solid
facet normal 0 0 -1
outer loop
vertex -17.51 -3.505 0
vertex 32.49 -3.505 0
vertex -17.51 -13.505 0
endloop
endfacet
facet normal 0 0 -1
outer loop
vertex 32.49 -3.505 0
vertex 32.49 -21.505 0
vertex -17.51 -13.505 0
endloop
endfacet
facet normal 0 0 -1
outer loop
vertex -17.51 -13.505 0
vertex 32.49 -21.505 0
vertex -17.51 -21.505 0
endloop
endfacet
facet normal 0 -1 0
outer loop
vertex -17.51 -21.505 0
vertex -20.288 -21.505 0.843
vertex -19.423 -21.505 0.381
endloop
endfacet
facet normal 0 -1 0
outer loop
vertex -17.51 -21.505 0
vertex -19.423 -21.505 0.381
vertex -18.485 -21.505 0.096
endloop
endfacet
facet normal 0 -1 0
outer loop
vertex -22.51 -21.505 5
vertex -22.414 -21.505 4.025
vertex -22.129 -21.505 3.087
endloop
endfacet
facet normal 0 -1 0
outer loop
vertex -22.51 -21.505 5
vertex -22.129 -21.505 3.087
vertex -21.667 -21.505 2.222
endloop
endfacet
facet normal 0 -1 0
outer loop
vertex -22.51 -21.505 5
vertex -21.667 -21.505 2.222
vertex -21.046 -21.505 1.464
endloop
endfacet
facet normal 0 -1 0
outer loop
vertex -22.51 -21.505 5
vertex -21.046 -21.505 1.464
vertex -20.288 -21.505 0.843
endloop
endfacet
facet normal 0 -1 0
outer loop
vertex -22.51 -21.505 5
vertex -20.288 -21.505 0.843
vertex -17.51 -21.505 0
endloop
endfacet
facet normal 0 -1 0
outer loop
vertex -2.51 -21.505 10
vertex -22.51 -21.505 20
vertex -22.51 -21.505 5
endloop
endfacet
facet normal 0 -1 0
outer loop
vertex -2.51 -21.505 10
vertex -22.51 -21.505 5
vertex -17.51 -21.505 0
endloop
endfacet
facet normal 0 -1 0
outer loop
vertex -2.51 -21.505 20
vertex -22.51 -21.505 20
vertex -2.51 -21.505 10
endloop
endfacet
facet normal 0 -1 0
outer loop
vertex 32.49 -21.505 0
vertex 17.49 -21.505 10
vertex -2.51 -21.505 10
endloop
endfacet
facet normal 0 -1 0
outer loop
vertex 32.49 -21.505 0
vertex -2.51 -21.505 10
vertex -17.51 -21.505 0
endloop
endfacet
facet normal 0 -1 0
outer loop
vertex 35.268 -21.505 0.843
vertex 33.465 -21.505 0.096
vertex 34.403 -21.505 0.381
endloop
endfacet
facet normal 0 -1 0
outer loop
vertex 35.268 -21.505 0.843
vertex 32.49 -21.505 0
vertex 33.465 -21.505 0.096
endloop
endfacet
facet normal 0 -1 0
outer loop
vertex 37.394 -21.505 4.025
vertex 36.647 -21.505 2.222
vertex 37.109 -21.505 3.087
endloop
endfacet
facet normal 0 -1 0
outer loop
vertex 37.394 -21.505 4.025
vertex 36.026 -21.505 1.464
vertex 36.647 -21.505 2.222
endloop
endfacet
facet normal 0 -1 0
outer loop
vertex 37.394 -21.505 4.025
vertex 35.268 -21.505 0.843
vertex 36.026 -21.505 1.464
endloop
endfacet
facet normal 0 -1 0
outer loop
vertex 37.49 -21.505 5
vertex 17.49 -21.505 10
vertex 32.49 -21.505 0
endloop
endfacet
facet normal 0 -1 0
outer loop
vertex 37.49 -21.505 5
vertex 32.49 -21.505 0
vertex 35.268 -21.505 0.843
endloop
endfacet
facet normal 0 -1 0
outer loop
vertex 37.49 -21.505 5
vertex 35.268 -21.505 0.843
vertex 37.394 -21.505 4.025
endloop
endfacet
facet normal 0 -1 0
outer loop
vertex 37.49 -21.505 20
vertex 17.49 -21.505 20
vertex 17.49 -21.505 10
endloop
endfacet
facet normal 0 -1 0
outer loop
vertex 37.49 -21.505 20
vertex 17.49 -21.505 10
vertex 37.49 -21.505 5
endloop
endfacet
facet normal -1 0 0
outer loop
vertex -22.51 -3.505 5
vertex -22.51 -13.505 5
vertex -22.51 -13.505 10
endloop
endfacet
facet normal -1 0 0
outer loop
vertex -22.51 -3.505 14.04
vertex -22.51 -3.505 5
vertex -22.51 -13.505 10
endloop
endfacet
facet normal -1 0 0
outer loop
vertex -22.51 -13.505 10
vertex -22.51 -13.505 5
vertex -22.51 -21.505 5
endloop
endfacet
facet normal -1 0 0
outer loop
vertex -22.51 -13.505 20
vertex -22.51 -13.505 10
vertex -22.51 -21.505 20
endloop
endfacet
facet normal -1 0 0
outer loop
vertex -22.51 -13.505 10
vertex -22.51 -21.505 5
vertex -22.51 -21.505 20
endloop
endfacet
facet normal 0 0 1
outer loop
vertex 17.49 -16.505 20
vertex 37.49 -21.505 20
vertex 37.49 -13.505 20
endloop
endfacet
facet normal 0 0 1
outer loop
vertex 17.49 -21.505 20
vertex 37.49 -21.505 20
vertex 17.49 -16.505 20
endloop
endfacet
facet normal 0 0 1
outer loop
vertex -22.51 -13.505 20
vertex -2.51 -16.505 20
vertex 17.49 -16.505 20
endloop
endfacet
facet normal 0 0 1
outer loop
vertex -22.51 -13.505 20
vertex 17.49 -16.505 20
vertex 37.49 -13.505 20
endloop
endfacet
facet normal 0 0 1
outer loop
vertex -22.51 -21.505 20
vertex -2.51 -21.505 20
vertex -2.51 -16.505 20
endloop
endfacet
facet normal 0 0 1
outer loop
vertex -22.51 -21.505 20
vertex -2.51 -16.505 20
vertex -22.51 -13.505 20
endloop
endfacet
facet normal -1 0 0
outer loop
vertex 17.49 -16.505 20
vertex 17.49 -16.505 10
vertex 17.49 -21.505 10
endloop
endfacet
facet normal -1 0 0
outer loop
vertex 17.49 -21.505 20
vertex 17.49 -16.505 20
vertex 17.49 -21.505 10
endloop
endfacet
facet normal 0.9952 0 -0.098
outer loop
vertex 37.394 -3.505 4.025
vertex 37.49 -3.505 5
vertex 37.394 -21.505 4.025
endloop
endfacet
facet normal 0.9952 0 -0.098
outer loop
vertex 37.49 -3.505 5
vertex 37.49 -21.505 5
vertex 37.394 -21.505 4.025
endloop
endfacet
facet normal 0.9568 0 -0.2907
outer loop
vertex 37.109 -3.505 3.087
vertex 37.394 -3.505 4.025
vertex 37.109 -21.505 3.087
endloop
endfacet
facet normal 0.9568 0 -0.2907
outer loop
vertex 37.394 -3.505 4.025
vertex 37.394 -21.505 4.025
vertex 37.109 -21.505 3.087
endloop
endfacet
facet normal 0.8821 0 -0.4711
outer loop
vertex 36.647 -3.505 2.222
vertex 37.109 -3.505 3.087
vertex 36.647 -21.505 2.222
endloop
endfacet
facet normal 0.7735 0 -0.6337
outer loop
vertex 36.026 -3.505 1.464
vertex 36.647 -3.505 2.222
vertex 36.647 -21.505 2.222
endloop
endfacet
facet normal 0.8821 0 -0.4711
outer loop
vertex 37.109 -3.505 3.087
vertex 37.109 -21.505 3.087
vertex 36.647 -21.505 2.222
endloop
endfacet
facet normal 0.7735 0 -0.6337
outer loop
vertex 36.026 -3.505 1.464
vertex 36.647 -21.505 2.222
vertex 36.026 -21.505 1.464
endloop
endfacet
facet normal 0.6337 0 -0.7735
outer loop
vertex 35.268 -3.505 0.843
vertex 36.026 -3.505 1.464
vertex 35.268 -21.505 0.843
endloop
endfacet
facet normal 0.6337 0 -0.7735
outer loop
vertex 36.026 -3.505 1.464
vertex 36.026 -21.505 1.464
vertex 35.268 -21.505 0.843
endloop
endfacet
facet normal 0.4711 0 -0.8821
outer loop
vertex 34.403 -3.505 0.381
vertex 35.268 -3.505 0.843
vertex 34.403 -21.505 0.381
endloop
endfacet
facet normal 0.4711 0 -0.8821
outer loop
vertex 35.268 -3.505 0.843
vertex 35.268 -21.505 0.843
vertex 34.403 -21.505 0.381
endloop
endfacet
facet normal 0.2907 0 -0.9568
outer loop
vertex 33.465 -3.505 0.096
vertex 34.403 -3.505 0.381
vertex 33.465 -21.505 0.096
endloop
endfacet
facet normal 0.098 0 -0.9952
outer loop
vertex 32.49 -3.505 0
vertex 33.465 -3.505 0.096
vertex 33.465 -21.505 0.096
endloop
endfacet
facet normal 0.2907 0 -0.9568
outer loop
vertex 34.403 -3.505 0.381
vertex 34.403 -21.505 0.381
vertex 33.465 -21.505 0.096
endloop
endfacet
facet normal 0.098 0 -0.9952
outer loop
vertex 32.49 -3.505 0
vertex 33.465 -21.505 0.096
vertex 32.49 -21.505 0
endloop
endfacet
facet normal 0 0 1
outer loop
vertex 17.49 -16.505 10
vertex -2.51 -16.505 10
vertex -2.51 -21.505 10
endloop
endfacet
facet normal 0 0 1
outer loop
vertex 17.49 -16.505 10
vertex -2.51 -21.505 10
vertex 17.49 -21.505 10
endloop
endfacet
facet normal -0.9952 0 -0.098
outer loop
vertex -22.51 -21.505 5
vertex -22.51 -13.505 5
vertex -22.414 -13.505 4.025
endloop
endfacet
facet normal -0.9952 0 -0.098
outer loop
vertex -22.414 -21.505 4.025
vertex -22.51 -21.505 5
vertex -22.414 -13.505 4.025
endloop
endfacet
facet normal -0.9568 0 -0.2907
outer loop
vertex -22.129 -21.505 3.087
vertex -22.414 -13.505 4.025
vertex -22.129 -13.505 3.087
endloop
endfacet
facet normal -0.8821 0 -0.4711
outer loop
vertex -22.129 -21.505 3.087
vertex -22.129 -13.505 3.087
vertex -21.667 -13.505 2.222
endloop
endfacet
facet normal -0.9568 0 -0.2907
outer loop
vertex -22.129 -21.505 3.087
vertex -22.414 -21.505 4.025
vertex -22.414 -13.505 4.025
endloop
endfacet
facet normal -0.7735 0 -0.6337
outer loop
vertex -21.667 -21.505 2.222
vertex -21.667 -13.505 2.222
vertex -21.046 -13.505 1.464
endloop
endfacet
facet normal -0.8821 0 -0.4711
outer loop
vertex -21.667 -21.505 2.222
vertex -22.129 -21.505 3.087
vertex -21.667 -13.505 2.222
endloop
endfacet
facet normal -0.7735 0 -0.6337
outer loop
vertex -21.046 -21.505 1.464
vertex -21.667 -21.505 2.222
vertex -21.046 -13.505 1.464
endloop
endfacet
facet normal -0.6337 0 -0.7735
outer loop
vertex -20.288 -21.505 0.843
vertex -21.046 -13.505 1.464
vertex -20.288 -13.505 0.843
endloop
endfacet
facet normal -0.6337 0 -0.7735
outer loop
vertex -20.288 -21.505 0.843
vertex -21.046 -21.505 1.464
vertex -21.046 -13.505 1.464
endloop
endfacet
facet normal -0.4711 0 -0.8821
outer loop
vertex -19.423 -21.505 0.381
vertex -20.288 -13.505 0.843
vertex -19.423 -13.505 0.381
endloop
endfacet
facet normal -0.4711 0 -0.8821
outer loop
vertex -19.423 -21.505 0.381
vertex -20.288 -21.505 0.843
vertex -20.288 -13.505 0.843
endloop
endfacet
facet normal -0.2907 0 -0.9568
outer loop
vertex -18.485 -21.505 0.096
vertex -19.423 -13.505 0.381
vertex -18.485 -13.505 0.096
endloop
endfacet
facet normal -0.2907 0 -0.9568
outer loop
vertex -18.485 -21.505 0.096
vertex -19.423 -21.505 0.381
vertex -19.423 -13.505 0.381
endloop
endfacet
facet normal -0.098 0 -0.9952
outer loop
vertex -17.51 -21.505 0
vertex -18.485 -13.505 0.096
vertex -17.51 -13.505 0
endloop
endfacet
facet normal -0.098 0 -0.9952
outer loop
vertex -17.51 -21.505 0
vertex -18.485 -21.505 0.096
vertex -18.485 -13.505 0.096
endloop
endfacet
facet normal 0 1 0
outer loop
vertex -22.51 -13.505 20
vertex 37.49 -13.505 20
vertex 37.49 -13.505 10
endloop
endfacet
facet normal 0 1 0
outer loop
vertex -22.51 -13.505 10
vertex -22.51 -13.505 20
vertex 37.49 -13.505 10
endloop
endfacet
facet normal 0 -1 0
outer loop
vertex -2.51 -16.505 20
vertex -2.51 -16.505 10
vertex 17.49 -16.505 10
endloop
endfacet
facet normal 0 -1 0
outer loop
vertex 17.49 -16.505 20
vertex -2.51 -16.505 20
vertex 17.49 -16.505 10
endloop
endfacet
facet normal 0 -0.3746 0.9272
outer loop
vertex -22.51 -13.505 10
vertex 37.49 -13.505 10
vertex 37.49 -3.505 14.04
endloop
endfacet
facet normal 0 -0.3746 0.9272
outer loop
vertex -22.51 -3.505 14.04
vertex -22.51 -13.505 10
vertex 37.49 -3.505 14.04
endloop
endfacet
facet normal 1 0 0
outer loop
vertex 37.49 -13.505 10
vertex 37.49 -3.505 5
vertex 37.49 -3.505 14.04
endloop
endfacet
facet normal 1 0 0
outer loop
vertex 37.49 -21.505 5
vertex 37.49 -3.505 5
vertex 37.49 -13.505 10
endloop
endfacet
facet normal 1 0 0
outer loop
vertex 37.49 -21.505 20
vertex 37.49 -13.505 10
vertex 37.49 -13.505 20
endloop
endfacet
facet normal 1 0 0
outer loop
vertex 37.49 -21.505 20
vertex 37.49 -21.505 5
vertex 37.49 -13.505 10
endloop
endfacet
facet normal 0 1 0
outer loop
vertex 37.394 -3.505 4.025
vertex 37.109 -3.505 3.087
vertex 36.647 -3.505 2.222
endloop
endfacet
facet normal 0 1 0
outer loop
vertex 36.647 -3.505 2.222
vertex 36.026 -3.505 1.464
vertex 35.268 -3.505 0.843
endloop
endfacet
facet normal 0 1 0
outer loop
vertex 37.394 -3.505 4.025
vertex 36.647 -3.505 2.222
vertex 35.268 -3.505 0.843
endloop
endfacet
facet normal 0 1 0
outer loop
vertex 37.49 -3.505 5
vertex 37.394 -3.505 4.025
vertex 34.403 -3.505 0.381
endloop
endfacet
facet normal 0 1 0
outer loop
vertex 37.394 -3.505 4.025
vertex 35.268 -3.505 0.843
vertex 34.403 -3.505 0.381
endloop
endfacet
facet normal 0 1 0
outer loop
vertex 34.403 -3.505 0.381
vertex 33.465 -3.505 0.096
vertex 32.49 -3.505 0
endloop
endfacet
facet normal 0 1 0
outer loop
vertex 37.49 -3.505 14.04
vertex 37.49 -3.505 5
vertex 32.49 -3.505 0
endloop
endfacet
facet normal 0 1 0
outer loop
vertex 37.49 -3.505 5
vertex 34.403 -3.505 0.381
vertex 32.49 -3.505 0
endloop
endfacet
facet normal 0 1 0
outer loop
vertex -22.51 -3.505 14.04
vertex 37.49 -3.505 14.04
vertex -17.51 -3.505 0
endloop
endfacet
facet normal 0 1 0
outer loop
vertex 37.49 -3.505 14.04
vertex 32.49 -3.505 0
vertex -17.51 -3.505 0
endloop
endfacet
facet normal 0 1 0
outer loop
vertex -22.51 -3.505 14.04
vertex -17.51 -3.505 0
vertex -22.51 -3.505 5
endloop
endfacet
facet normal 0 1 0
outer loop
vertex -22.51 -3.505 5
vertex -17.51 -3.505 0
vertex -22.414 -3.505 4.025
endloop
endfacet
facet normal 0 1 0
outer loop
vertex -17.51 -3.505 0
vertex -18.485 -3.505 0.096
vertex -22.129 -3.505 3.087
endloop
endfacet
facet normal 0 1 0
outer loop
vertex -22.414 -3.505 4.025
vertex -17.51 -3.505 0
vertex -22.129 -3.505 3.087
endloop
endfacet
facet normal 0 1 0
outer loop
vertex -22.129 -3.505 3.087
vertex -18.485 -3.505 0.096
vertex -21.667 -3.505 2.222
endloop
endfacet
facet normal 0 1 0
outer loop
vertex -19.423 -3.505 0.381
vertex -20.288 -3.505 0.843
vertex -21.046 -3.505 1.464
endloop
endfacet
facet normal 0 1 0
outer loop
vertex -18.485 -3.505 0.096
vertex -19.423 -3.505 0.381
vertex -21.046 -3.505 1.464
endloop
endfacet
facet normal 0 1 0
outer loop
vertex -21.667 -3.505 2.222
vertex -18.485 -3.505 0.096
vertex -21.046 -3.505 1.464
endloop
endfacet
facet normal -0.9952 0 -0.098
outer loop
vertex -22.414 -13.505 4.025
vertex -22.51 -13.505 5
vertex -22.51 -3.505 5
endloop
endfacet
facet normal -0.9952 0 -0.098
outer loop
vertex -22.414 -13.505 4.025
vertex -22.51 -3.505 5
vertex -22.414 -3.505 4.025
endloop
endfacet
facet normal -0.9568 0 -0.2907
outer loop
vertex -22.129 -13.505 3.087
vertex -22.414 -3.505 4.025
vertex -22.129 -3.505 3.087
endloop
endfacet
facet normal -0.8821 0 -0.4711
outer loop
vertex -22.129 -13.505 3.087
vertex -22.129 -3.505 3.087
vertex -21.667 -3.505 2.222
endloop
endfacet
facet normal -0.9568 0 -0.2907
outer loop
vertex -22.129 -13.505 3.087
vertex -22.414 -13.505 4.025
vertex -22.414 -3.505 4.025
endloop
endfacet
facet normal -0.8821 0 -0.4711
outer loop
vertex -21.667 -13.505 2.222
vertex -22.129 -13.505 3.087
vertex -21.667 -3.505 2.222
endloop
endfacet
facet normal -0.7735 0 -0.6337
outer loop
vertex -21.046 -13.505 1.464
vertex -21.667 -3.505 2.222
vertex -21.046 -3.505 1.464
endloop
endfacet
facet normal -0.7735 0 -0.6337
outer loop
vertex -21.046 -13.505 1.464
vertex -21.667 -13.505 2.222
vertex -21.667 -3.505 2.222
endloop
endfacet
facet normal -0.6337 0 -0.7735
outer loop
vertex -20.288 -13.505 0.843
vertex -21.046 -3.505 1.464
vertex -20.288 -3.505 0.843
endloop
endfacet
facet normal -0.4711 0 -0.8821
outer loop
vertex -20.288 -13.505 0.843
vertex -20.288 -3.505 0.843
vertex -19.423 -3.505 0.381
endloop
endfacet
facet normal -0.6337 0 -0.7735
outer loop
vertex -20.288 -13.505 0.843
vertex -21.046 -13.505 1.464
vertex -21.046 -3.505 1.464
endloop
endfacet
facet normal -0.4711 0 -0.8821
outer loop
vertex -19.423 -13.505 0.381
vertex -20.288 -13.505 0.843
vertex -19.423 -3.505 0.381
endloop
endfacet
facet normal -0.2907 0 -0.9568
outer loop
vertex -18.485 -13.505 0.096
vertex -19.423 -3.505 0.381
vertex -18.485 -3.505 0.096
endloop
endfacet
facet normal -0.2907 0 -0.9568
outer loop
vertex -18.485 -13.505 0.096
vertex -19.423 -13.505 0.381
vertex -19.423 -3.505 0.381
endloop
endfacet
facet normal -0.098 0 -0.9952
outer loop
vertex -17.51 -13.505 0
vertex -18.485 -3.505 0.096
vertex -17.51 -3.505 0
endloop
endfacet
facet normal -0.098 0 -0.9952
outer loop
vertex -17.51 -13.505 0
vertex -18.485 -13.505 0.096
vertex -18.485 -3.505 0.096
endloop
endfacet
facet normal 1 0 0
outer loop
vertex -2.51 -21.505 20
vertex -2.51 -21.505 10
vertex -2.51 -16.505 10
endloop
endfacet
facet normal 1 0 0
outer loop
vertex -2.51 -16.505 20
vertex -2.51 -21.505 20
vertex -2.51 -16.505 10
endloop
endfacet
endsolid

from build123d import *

# Parameters (mm, degrees)
F1_DEPTH = 20
F2_R     = 5
F3_W     = 20
F3_H     = 10
F4_DEPTH = 5
F5_DEPTH = 10
F7_DEPTH = 60.001


with BuildPart() as f1:
    # F0 (on Top) → F1 (new body)
    with BuildSketch(Plane.XY):
        Polygon((17.4899780222, -16.504585755), (17.4899780222, -21.504585755), (37.4899780222, -21.504585755), (37.4899780222, -13.504585755), (-22.5100219778, -13.504585755), (-22.5100219778, -21.504585755), (-2.5100219778, -21.504585755), (-2.5100219778, -16.504585755), align=None)
    extrude(amount=F1_DEPTH)

    # F2
    f2_edges = [f1.edges().sort_by_distance(p)[0] for p in [
        (-22.510022, -17.504586, 0),
        (37.489978, -17.504586, 0),
    ]]
    fillet(f2_edges, radius=F2_R)

    # F3 (on face) → F4 (join)
    with BuildSketch(Plane.XZ.offset(16.504585755)):
        with Locations((7.4899780222, 5)):
            Rectangle(F3_W, F3_H)
    extrude(amount=F4_DEPTH)

    # F5 (add): a face of the model
    f5_faces = [f1.faces().sort_by_distance(p)[0] for p in [
        (7.4899780222, -13.504585755, 10.0801475974),
    ]]
    extrude(f5_faces, amount=F5_DEPTH)

    # F6 (on face) → F7 (cut, through all)
    with BuildSketch(Plane.YZ.offset(37.4899780222)):
        Polygon((-3.504585755, 14.0402622584), (-3.504585755, 20), (-13.504585755, 20), (-13.504585755, 10), align=None)
    extrude(amount=-F7_DEPTH, mode=Mode.SUBTRACT)


solid = f1.part
